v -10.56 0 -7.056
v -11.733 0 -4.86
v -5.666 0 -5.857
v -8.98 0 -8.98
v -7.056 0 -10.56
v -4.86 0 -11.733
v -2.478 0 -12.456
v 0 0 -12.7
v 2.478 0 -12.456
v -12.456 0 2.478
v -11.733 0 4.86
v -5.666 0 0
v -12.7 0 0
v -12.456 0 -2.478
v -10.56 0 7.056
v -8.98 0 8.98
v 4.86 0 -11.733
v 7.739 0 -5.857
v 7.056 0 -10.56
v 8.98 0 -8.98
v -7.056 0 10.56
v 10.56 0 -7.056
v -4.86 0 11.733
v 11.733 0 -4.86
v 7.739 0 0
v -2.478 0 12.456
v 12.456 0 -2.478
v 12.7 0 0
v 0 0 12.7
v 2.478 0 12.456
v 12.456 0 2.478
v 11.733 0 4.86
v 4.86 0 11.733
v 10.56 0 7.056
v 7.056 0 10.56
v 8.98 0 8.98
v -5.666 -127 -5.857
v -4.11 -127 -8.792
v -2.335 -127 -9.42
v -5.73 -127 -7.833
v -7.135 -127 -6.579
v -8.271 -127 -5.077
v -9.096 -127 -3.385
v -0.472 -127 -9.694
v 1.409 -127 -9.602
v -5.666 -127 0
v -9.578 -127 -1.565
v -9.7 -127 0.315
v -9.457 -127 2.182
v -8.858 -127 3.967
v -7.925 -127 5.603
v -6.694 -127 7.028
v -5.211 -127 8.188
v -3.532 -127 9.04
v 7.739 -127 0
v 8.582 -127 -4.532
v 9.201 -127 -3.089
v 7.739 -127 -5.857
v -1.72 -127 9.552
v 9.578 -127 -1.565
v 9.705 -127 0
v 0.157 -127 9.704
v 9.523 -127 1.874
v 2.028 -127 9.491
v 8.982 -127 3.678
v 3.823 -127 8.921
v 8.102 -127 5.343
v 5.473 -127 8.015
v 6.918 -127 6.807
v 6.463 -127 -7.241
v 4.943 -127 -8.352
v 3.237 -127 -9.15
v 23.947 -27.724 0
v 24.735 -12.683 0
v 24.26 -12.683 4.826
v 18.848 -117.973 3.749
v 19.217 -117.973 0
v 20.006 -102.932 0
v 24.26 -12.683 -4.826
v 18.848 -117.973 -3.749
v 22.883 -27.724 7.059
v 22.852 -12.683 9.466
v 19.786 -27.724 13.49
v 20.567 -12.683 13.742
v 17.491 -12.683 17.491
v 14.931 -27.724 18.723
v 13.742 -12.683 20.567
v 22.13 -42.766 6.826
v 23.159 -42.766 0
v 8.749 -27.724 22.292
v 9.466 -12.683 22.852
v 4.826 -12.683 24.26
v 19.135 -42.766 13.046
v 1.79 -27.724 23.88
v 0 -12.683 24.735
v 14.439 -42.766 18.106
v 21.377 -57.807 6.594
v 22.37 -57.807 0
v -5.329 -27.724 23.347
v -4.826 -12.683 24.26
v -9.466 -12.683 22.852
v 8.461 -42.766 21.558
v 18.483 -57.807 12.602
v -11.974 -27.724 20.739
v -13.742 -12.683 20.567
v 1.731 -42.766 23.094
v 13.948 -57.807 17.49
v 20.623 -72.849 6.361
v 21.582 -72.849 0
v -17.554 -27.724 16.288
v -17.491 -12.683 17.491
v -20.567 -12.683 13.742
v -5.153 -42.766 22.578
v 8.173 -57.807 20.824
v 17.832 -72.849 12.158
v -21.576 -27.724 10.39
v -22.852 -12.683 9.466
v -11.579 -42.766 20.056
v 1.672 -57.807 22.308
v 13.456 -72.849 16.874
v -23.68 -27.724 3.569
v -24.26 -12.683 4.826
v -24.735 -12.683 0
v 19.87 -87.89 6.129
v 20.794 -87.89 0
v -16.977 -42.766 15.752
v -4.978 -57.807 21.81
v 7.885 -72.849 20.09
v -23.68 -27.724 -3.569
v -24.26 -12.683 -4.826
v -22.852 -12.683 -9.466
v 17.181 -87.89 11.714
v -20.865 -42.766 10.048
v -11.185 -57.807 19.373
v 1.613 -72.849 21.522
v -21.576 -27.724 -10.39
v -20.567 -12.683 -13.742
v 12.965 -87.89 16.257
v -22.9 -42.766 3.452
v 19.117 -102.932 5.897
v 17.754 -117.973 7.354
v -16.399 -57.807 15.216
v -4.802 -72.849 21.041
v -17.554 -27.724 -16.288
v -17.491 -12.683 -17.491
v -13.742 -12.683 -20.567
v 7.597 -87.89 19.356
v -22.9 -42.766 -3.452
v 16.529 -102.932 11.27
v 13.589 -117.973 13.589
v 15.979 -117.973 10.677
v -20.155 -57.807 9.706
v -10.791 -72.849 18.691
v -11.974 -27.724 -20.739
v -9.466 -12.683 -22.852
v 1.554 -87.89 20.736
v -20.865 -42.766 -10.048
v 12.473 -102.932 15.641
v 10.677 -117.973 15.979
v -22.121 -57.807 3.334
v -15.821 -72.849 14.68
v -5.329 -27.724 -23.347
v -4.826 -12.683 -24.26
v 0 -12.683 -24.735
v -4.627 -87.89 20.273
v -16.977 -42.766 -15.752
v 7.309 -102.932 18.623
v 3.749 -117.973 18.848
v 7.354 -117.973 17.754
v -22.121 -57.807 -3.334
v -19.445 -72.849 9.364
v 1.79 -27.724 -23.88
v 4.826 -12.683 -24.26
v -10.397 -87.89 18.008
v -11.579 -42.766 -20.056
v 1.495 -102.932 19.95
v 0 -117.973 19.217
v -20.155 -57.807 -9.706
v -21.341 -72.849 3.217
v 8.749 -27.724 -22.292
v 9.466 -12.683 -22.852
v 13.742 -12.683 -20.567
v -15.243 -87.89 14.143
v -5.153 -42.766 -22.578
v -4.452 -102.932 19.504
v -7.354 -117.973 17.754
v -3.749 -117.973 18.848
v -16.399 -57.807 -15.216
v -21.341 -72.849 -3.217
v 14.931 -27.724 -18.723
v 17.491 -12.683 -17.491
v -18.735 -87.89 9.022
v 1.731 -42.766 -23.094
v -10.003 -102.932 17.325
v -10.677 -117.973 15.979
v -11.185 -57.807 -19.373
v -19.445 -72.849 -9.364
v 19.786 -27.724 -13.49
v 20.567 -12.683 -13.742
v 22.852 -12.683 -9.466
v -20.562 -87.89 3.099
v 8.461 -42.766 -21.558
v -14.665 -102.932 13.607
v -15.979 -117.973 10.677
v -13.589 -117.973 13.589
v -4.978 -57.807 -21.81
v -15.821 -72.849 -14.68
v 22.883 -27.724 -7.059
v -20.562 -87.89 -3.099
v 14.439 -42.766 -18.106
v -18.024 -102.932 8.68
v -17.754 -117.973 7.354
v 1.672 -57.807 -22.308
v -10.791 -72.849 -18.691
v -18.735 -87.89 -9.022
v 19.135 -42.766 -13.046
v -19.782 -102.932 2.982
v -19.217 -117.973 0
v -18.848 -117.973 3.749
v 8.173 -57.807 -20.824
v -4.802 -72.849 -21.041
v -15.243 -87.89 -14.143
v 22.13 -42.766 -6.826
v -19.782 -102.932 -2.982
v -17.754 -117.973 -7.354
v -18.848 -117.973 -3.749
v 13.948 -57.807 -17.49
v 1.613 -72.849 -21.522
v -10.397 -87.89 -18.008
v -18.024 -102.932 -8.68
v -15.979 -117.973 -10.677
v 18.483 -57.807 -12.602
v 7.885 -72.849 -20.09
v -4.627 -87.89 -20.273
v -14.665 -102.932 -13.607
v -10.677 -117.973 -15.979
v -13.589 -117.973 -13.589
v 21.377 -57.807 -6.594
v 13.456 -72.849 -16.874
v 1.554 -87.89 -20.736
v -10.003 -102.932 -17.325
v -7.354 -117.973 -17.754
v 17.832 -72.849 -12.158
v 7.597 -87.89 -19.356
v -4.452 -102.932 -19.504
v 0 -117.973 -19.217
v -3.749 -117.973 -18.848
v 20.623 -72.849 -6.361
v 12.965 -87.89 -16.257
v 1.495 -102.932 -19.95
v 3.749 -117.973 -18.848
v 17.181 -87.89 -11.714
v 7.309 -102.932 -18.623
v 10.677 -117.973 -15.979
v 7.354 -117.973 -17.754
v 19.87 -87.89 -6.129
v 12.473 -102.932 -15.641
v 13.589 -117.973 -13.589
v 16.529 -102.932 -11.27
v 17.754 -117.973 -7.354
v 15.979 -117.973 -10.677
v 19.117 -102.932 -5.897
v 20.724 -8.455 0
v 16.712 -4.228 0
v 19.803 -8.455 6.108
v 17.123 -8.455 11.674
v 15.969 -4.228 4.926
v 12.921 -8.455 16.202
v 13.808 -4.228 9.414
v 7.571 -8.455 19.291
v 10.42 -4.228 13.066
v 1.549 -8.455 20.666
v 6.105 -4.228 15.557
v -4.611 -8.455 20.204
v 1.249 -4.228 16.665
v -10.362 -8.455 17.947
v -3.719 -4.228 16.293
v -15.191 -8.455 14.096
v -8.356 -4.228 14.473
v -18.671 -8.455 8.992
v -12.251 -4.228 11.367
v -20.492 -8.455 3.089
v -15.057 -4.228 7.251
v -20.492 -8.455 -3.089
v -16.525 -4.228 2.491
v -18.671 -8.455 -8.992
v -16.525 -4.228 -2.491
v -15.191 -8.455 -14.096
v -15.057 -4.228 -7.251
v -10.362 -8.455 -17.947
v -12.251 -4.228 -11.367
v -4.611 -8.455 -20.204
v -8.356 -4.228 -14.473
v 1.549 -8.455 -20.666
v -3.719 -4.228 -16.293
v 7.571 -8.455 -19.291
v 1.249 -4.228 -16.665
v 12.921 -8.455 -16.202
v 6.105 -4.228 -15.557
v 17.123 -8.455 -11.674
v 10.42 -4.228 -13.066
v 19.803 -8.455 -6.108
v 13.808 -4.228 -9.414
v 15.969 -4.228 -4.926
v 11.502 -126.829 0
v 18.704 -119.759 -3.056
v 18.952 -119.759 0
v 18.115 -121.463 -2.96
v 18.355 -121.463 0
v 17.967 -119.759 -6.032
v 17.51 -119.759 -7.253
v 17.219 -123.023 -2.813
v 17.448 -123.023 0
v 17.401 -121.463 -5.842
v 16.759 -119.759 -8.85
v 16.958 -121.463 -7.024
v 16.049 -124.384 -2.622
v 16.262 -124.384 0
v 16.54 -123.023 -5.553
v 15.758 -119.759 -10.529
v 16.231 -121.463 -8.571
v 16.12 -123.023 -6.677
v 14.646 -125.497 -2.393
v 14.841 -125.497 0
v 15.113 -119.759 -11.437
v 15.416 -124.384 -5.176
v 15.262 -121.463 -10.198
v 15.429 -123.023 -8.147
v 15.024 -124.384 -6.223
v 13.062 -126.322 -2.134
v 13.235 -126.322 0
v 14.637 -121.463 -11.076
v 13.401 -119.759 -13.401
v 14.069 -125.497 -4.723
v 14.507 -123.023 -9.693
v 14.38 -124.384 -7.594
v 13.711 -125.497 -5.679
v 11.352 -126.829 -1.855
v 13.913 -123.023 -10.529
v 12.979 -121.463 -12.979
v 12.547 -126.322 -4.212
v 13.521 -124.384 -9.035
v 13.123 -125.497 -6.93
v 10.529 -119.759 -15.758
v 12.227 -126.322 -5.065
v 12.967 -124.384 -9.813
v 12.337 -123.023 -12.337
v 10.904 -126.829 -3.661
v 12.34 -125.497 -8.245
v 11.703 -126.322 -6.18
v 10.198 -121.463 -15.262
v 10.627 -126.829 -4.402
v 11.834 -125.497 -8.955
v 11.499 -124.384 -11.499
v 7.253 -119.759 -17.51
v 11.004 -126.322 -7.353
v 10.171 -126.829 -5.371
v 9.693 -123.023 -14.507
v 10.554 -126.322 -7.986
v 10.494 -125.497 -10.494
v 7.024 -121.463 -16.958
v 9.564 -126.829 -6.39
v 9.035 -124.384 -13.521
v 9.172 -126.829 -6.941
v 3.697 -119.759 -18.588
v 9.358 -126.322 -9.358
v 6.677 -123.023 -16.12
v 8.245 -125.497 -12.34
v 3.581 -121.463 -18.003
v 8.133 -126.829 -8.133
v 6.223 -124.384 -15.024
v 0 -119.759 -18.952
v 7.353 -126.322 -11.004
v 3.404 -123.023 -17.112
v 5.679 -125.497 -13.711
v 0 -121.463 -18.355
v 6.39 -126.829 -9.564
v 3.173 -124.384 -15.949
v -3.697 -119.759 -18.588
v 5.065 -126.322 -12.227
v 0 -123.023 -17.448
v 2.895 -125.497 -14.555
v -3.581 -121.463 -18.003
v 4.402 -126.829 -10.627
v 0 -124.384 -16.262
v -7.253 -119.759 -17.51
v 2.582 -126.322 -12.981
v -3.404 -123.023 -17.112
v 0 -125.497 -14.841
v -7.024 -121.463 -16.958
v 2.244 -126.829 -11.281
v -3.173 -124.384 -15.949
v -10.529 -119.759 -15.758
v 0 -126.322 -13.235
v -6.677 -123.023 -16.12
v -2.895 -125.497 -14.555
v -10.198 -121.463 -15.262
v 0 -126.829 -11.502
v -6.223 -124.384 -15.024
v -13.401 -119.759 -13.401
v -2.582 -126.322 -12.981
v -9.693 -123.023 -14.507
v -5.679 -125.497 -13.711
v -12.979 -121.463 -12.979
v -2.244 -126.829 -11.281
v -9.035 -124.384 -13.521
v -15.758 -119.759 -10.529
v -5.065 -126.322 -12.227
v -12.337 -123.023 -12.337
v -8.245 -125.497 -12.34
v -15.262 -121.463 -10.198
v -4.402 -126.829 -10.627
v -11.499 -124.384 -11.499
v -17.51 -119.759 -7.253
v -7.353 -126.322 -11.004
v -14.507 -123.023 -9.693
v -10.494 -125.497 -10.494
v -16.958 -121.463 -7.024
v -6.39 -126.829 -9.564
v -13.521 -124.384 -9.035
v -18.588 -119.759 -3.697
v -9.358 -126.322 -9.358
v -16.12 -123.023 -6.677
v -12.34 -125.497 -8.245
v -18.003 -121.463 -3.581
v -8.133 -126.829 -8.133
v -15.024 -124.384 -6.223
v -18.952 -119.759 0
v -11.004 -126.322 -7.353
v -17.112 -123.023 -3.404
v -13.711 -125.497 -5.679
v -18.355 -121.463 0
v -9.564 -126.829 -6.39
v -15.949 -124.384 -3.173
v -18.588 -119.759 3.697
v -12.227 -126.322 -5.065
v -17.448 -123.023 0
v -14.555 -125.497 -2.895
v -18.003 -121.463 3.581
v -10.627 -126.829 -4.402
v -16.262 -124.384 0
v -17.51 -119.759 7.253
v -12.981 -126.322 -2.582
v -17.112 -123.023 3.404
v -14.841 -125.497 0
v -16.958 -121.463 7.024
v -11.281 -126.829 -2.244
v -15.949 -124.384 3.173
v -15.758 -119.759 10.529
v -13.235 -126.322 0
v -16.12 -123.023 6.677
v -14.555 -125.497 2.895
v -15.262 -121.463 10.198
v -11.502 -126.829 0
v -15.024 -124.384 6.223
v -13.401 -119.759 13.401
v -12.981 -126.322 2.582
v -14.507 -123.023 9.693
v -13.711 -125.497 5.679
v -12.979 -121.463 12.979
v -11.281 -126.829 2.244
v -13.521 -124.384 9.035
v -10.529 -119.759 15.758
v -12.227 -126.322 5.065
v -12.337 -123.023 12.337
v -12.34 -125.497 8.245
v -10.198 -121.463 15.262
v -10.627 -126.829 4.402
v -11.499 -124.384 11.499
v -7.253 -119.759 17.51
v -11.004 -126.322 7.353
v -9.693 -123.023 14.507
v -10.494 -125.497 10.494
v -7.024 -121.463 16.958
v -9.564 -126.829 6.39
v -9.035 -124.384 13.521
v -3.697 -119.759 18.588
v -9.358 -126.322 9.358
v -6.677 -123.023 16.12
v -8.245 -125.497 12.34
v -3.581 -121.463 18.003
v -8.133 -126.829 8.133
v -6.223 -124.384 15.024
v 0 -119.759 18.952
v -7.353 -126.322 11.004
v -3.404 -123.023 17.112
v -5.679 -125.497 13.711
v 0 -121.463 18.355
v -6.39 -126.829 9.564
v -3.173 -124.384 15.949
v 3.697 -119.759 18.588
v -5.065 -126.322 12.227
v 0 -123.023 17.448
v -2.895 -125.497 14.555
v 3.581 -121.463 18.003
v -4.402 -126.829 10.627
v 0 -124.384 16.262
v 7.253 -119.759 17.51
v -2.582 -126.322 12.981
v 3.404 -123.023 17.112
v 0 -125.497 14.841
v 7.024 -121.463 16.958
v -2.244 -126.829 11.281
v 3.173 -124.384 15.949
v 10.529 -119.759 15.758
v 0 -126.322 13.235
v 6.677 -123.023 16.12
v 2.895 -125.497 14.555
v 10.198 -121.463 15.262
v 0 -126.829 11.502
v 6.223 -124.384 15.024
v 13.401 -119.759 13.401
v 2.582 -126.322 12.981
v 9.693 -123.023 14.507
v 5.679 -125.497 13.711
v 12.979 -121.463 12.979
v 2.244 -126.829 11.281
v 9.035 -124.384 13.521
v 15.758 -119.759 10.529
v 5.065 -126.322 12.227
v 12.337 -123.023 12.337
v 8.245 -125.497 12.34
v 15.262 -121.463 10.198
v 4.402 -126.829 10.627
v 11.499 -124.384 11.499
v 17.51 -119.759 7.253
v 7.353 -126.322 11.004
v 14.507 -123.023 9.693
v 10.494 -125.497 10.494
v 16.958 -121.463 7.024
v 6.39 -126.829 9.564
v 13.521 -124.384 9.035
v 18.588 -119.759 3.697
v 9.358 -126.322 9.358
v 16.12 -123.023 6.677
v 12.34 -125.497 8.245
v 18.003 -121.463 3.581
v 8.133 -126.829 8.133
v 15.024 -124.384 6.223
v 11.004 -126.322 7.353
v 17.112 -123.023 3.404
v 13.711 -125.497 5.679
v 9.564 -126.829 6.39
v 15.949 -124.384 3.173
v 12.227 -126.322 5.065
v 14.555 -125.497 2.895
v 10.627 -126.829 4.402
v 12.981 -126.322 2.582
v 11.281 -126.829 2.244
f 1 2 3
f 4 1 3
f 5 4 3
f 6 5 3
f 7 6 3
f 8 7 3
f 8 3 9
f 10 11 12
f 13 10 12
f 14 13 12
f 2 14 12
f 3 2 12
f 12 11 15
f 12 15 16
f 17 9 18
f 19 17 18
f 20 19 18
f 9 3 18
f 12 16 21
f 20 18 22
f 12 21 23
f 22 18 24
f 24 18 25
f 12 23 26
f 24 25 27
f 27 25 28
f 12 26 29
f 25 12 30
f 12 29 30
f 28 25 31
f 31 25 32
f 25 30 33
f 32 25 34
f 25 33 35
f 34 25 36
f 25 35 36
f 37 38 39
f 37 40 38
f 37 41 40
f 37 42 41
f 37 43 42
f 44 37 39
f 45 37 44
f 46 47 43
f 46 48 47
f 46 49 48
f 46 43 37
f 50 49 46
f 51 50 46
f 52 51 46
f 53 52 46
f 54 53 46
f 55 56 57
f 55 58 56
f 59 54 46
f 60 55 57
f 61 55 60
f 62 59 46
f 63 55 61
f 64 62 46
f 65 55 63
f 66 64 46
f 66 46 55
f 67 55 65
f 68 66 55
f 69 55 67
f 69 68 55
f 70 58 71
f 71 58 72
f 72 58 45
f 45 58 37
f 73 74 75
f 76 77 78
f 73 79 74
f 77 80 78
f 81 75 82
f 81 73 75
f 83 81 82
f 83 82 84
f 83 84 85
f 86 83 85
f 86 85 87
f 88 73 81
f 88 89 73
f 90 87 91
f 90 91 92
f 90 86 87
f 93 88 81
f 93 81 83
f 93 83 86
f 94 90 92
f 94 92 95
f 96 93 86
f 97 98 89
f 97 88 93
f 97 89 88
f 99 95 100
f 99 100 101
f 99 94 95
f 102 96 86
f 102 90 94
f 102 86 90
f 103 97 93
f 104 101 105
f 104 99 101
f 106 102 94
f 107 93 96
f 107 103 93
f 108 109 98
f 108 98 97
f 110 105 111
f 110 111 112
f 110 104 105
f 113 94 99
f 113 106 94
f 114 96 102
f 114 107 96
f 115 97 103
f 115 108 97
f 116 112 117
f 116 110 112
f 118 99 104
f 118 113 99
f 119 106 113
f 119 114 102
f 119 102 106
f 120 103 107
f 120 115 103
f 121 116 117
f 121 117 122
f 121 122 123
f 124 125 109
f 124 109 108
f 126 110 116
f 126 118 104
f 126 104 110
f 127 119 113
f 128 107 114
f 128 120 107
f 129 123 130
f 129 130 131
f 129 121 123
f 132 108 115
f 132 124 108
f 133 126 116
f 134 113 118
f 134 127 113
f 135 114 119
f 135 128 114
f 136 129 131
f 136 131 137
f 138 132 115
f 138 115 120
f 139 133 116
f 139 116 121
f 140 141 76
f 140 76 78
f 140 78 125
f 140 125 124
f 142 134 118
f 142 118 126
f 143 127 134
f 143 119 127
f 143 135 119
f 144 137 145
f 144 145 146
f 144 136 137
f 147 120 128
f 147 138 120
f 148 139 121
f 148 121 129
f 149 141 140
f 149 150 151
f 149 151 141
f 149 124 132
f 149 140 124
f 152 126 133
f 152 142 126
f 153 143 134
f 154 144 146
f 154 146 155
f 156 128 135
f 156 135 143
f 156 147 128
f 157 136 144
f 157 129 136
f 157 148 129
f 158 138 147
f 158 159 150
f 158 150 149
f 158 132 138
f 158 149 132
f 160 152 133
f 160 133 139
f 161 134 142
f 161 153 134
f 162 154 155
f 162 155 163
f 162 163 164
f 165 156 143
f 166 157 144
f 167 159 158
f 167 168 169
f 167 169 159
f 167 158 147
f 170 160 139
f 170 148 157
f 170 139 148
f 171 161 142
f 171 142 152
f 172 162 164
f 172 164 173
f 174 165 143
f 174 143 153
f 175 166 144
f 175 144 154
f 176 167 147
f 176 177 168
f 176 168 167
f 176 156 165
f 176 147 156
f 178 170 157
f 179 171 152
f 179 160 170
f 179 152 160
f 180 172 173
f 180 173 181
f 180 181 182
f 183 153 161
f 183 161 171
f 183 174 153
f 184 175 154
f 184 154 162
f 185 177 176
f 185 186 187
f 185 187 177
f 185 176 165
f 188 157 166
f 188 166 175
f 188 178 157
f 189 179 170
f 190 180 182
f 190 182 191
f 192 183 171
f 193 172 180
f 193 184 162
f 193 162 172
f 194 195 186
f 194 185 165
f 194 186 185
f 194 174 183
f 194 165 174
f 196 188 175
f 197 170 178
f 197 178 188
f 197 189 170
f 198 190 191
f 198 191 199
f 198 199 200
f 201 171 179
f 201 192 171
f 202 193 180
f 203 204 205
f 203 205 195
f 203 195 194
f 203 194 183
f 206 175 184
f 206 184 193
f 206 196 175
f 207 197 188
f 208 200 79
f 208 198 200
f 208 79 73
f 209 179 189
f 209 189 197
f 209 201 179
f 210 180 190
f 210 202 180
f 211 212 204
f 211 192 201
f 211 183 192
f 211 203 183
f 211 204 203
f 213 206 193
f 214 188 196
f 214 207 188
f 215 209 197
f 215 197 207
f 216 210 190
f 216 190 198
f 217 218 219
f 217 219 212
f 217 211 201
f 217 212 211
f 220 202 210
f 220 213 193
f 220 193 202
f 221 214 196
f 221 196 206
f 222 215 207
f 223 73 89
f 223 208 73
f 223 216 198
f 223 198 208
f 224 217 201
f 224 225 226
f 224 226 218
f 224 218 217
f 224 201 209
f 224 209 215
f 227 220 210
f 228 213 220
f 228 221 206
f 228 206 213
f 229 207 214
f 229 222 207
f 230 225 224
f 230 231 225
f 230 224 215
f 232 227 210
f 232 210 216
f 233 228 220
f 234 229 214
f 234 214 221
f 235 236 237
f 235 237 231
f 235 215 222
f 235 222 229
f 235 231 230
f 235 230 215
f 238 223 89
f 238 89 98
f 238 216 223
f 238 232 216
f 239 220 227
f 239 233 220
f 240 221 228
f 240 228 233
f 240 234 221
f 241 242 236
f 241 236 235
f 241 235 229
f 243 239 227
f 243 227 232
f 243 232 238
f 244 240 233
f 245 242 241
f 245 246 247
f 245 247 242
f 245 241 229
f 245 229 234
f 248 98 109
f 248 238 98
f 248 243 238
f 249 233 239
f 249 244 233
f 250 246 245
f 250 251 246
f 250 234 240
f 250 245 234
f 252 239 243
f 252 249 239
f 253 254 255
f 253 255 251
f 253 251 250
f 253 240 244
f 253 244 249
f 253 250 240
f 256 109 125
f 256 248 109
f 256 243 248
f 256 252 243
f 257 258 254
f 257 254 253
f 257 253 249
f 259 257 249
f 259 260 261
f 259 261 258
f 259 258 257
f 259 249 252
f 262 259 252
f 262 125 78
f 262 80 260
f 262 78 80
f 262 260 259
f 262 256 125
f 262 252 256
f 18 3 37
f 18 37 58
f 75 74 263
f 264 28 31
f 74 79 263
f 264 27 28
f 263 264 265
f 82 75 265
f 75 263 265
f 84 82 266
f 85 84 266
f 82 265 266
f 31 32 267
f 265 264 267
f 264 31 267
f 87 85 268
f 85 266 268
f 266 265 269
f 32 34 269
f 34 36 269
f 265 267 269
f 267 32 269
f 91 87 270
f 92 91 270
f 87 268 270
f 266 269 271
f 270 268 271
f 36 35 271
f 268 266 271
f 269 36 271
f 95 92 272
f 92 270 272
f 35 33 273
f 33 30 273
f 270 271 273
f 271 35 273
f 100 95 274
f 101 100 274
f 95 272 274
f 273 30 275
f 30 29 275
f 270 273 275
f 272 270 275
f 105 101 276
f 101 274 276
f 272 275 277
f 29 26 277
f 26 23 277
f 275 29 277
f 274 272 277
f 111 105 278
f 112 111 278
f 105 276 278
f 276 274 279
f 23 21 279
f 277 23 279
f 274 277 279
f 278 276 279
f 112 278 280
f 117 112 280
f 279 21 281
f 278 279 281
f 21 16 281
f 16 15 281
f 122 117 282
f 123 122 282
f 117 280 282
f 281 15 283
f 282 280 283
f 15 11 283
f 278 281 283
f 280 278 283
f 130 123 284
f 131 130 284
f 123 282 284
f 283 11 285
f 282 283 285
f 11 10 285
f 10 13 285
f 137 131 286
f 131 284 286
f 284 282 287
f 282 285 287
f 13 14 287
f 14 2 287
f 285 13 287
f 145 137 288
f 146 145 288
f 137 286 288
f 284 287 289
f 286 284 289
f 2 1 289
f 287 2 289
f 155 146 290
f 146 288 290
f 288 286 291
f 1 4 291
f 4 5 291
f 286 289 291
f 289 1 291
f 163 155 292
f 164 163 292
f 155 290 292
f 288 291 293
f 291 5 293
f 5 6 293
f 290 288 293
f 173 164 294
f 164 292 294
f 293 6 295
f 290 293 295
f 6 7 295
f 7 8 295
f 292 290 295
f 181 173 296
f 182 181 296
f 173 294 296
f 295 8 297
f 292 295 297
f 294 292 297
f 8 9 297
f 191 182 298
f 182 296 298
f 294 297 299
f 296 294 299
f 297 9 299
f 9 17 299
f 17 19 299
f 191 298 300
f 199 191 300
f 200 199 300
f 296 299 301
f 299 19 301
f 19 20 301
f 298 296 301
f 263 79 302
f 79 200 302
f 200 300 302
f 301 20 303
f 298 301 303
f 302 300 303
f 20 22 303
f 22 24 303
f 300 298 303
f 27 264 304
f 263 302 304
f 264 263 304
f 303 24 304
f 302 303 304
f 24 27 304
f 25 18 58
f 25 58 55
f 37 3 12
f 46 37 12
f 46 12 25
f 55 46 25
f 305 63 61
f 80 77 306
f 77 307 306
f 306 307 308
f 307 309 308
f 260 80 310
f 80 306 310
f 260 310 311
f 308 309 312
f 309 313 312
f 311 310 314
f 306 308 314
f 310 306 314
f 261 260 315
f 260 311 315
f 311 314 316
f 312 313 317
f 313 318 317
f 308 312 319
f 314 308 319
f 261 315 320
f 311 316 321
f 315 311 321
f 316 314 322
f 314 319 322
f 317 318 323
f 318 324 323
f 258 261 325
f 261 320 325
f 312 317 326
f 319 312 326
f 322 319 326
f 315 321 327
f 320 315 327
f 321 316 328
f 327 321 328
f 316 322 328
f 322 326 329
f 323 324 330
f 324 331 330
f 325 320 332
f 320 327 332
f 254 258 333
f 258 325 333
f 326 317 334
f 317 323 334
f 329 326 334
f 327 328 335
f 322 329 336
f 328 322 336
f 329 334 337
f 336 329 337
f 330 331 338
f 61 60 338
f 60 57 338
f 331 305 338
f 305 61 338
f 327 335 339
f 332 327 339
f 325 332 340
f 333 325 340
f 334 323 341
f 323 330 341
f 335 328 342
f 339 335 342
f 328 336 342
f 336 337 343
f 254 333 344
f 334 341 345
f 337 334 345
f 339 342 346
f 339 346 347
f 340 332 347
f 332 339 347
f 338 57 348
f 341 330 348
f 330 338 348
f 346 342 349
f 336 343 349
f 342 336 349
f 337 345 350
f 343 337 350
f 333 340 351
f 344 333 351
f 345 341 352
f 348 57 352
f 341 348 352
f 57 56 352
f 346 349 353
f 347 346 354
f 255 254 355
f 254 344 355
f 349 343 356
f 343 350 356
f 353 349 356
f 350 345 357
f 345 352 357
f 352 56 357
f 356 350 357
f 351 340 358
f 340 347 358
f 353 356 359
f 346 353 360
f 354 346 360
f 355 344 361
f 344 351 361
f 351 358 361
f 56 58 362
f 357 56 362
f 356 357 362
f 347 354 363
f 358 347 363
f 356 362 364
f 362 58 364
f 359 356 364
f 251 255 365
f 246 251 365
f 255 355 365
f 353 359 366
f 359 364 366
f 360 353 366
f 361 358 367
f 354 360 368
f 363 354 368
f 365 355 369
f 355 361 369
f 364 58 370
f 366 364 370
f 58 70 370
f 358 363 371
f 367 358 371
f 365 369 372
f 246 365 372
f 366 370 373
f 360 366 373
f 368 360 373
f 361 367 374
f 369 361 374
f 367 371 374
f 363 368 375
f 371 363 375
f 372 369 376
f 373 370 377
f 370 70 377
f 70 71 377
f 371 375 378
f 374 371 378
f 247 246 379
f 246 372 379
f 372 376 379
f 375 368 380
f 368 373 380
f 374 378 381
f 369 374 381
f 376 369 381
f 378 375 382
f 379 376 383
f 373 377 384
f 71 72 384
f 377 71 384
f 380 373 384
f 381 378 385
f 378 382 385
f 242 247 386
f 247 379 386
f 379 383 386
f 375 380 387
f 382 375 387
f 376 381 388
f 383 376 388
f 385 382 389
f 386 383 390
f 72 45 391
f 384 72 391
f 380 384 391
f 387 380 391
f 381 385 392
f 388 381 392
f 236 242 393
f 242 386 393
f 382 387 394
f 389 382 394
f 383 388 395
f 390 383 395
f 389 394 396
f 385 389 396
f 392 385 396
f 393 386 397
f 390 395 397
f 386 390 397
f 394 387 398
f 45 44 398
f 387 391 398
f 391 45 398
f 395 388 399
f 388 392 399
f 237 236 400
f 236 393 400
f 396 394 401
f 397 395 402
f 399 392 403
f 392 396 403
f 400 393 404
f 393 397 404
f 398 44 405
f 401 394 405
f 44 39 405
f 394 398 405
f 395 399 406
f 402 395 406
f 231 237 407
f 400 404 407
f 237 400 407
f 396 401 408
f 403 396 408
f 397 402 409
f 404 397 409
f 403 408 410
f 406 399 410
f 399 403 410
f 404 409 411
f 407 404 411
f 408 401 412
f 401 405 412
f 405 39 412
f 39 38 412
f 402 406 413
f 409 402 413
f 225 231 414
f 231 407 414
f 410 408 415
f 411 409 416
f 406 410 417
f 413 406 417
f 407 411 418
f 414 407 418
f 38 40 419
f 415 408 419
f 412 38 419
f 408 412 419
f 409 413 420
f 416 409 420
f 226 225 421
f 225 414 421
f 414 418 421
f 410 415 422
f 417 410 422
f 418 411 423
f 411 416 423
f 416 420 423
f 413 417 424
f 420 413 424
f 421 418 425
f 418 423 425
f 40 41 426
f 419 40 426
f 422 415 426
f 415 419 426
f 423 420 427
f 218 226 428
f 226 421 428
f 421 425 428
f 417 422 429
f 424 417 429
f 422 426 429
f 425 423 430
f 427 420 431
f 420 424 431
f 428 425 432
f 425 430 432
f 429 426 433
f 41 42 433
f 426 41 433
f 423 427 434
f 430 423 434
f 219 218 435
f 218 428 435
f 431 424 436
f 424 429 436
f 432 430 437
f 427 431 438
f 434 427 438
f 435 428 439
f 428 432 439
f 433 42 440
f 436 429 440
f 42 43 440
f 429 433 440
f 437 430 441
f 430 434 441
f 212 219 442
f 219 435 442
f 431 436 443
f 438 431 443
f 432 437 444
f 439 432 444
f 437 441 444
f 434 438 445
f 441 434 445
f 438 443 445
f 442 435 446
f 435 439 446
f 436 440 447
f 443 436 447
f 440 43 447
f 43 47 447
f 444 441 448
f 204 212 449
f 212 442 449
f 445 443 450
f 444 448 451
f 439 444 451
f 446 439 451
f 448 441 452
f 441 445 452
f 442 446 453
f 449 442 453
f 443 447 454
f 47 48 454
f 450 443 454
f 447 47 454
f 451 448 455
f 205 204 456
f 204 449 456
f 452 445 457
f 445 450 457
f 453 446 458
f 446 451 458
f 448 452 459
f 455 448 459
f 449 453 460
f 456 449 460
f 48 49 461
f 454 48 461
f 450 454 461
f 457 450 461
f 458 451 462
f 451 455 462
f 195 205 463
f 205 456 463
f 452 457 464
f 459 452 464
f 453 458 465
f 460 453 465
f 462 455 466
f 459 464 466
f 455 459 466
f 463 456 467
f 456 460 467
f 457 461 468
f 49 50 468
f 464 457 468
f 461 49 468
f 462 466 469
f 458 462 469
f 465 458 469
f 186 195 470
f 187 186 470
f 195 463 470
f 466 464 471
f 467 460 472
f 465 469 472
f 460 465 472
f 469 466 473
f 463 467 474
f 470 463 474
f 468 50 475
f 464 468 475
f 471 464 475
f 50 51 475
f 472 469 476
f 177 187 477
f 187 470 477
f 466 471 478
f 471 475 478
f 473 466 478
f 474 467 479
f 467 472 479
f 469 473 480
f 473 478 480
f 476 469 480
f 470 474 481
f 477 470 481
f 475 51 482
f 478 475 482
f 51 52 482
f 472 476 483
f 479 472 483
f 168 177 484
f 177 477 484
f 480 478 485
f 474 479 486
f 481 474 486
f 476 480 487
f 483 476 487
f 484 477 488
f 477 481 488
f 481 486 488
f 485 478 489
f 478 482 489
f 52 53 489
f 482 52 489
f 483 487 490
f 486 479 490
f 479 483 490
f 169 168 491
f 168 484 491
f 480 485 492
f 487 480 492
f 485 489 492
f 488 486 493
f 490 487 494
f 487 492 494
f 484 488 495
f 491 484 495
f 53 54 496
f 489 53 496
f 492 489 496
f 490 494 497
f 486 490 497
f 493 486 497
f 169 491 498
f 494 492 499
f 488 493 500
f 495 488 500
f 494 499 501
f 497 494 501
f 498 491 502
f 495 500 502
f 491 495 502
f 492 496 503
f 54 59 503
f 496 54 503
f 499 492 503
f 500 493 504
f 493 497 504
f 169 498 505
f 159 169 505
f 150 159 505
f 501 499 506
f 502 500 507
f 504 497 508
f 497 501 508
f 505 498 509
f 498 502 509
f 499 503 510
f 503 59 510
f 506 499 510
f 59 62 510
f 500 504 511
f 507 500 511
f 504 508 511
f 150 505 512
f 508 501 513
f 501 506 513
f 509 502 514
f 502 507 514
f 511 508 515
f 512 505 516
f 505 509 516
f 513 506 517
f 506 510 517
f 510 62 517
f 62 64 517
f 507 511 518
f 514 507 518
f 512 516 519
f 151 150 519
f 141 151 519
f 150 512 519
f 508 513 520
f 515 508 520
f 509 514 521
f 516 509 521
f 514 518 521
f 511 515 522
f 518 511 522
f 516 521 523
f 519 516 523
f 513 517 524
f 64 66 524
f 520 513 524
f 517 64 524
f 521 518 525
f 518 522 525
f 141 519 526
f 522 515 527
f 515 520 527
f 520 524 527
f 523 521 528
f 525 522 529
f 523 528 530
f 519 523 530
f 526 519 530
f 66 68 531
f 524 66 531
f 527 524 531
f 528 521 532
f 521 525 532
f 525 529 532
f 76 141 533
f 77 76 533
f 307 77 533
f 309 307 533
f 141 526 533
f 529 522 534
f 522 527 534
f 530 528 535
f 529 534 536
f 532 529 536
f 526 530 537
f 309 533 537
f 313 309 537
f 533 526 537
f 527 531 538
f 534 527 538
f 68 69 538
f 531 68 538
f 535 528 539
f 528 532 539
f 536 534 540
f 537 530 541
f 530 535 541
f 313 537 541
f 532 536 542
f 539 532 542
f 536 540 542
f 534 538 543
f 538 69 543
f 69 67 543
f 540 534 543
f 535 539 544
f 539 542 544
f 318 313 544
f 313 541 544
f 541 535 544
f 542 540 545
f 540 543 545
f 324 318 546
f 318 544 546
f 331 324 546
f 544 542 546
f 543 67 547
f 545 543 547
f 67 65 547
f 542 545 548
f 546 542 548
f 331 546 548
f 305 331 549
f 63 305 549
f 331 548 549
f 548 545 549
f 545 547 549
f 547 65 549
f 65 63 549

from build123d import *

# Parameters (mm, degrees)
F0_R     = 25.4
F1_DEPTH = 127
F1_TAPER = 3
F2_R     = 9.525
F3_SIZE  = 12.7
F4_W     = 13.4048998849
F4_H     = 5.8565368653
F5_DEPTH = 127.001


with BuildPart() as f1:
    # F0 (on Front) → F1 (new body)
    with BuildSketch(Plane.XZ):
        Circle(F0_R)
    extrude(amount=F1_DEPTH, taper=F1_TAPER)

    # F2
    f2_edges = [f1.edges().sort_by_distance(p)[0] for p in [
        (-18.744212, -127, 0),
    ]]
    fillet(f2_edges, radius=F2_R)

    # F3
    f3_edges = [f1.edges().sort_by_distance(p)[0] for p in [
        (-25.4, 0, 0),
    ]]
    chamfer(f3_edges, length=F3_SIZE)

    # F4 (on face) → F5 (cut, through all)
    with BuildSketch(Plane.XZ.offset(127)):
        with Locations((1.0366908521, -2.9282684326)):
            Rectangle(F4_W, F4_H)
    extrude(amount=-F5_DEPTH, mode=Mode.SUBTRACT)


solid = f1.part
